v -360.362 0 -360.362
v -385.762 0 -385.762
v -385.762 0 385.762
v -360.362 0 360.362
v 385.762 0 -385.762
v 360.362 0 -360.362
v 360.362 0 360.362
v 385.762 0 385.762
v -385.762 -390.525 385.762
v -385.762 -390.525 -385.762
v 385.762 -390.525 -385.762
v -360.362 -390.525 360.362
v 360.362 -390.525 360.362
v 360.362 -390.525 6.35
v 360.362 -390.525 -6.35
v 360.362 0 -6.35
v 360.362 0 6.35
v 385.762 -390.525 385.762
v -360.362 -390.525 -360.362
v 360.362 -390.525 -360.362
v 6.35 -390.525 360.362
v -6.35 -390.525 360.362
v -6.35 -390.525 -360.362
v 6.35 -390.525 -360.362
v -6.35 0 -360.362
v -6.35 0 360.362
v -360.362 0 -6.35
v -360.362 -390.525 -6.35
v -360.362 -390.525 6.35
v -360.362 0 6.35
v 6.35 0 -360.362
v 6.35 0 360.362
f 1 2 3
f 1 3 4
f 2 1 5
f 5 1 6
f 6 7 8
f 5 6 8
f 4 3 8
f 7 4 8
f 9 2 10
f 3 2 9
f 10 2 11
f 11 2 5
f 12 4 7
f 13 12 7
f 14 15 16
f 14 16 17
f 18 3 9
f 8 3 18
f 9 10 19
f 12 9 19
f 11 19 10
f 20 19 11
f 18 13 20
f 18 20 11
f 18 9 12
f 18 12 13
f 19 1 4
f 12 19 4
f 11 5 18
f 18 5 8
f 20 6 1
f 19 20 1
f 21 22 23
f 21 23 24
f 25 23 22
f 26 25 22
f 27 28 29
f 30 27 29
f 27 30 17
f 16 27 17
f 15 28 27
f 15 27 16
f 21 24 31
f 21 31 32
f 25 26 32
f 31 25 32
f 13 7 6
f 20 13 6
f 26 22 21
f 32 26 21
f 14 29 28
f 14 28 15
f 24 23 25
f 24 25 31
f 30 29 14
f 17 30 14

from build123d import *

# Parameters (mm, degrees)
F0_W     = 771.525
F0_H     = 771.525
F1_DEPTH = 390.525
F2_W     = 720.725
F2_H     = 12.7
F3_DEPTH = 390.525
F4_W     = 12.7
F4_H     = 720.725
F5_DEPTH = 390.525


with BuildPart() as f1:
    # F0 (on Front) → F1 (new body)
    with BuildSketch(Plane.XZ):
        Rectangle(F0_W, F0_H)
        Polygon((360.3625, -6.35), (360.3625, -360.3625), (6.35, -360.3625), (-6.35, -360.3625), (-360.3625, -360.3625), (-360.3625, -6.35), (-360.3625, 6.35), (-360.3625, 360.3625), (-6.35, 360.3625), (6.35, 360.3625), (360.3625, 360.3625), (360.3625, 6.35), align=None, mode=Mode.SUBTRACT)
    extrude(amount=F1_DEPTH)


with BuildPart() as f3:
    # F2 (on face) → F3 (new body)
    with BuildSketch(Plane.XZ.offset(390.525)):
        Rectangle(F2_W, F2_H)
    extrude(amount=-F3_DEPTH)


with BuildPart() as f5:
    # F4 (on face) → F5 (new body)
    with BuildSketch(Plane.XZ.offset(390.525)):
        Rectangle(F4_W, F4_H)
    extrude(amount=-F5_DEPTH)


solid = Compound([f1.part, f3.part, f5.part])
